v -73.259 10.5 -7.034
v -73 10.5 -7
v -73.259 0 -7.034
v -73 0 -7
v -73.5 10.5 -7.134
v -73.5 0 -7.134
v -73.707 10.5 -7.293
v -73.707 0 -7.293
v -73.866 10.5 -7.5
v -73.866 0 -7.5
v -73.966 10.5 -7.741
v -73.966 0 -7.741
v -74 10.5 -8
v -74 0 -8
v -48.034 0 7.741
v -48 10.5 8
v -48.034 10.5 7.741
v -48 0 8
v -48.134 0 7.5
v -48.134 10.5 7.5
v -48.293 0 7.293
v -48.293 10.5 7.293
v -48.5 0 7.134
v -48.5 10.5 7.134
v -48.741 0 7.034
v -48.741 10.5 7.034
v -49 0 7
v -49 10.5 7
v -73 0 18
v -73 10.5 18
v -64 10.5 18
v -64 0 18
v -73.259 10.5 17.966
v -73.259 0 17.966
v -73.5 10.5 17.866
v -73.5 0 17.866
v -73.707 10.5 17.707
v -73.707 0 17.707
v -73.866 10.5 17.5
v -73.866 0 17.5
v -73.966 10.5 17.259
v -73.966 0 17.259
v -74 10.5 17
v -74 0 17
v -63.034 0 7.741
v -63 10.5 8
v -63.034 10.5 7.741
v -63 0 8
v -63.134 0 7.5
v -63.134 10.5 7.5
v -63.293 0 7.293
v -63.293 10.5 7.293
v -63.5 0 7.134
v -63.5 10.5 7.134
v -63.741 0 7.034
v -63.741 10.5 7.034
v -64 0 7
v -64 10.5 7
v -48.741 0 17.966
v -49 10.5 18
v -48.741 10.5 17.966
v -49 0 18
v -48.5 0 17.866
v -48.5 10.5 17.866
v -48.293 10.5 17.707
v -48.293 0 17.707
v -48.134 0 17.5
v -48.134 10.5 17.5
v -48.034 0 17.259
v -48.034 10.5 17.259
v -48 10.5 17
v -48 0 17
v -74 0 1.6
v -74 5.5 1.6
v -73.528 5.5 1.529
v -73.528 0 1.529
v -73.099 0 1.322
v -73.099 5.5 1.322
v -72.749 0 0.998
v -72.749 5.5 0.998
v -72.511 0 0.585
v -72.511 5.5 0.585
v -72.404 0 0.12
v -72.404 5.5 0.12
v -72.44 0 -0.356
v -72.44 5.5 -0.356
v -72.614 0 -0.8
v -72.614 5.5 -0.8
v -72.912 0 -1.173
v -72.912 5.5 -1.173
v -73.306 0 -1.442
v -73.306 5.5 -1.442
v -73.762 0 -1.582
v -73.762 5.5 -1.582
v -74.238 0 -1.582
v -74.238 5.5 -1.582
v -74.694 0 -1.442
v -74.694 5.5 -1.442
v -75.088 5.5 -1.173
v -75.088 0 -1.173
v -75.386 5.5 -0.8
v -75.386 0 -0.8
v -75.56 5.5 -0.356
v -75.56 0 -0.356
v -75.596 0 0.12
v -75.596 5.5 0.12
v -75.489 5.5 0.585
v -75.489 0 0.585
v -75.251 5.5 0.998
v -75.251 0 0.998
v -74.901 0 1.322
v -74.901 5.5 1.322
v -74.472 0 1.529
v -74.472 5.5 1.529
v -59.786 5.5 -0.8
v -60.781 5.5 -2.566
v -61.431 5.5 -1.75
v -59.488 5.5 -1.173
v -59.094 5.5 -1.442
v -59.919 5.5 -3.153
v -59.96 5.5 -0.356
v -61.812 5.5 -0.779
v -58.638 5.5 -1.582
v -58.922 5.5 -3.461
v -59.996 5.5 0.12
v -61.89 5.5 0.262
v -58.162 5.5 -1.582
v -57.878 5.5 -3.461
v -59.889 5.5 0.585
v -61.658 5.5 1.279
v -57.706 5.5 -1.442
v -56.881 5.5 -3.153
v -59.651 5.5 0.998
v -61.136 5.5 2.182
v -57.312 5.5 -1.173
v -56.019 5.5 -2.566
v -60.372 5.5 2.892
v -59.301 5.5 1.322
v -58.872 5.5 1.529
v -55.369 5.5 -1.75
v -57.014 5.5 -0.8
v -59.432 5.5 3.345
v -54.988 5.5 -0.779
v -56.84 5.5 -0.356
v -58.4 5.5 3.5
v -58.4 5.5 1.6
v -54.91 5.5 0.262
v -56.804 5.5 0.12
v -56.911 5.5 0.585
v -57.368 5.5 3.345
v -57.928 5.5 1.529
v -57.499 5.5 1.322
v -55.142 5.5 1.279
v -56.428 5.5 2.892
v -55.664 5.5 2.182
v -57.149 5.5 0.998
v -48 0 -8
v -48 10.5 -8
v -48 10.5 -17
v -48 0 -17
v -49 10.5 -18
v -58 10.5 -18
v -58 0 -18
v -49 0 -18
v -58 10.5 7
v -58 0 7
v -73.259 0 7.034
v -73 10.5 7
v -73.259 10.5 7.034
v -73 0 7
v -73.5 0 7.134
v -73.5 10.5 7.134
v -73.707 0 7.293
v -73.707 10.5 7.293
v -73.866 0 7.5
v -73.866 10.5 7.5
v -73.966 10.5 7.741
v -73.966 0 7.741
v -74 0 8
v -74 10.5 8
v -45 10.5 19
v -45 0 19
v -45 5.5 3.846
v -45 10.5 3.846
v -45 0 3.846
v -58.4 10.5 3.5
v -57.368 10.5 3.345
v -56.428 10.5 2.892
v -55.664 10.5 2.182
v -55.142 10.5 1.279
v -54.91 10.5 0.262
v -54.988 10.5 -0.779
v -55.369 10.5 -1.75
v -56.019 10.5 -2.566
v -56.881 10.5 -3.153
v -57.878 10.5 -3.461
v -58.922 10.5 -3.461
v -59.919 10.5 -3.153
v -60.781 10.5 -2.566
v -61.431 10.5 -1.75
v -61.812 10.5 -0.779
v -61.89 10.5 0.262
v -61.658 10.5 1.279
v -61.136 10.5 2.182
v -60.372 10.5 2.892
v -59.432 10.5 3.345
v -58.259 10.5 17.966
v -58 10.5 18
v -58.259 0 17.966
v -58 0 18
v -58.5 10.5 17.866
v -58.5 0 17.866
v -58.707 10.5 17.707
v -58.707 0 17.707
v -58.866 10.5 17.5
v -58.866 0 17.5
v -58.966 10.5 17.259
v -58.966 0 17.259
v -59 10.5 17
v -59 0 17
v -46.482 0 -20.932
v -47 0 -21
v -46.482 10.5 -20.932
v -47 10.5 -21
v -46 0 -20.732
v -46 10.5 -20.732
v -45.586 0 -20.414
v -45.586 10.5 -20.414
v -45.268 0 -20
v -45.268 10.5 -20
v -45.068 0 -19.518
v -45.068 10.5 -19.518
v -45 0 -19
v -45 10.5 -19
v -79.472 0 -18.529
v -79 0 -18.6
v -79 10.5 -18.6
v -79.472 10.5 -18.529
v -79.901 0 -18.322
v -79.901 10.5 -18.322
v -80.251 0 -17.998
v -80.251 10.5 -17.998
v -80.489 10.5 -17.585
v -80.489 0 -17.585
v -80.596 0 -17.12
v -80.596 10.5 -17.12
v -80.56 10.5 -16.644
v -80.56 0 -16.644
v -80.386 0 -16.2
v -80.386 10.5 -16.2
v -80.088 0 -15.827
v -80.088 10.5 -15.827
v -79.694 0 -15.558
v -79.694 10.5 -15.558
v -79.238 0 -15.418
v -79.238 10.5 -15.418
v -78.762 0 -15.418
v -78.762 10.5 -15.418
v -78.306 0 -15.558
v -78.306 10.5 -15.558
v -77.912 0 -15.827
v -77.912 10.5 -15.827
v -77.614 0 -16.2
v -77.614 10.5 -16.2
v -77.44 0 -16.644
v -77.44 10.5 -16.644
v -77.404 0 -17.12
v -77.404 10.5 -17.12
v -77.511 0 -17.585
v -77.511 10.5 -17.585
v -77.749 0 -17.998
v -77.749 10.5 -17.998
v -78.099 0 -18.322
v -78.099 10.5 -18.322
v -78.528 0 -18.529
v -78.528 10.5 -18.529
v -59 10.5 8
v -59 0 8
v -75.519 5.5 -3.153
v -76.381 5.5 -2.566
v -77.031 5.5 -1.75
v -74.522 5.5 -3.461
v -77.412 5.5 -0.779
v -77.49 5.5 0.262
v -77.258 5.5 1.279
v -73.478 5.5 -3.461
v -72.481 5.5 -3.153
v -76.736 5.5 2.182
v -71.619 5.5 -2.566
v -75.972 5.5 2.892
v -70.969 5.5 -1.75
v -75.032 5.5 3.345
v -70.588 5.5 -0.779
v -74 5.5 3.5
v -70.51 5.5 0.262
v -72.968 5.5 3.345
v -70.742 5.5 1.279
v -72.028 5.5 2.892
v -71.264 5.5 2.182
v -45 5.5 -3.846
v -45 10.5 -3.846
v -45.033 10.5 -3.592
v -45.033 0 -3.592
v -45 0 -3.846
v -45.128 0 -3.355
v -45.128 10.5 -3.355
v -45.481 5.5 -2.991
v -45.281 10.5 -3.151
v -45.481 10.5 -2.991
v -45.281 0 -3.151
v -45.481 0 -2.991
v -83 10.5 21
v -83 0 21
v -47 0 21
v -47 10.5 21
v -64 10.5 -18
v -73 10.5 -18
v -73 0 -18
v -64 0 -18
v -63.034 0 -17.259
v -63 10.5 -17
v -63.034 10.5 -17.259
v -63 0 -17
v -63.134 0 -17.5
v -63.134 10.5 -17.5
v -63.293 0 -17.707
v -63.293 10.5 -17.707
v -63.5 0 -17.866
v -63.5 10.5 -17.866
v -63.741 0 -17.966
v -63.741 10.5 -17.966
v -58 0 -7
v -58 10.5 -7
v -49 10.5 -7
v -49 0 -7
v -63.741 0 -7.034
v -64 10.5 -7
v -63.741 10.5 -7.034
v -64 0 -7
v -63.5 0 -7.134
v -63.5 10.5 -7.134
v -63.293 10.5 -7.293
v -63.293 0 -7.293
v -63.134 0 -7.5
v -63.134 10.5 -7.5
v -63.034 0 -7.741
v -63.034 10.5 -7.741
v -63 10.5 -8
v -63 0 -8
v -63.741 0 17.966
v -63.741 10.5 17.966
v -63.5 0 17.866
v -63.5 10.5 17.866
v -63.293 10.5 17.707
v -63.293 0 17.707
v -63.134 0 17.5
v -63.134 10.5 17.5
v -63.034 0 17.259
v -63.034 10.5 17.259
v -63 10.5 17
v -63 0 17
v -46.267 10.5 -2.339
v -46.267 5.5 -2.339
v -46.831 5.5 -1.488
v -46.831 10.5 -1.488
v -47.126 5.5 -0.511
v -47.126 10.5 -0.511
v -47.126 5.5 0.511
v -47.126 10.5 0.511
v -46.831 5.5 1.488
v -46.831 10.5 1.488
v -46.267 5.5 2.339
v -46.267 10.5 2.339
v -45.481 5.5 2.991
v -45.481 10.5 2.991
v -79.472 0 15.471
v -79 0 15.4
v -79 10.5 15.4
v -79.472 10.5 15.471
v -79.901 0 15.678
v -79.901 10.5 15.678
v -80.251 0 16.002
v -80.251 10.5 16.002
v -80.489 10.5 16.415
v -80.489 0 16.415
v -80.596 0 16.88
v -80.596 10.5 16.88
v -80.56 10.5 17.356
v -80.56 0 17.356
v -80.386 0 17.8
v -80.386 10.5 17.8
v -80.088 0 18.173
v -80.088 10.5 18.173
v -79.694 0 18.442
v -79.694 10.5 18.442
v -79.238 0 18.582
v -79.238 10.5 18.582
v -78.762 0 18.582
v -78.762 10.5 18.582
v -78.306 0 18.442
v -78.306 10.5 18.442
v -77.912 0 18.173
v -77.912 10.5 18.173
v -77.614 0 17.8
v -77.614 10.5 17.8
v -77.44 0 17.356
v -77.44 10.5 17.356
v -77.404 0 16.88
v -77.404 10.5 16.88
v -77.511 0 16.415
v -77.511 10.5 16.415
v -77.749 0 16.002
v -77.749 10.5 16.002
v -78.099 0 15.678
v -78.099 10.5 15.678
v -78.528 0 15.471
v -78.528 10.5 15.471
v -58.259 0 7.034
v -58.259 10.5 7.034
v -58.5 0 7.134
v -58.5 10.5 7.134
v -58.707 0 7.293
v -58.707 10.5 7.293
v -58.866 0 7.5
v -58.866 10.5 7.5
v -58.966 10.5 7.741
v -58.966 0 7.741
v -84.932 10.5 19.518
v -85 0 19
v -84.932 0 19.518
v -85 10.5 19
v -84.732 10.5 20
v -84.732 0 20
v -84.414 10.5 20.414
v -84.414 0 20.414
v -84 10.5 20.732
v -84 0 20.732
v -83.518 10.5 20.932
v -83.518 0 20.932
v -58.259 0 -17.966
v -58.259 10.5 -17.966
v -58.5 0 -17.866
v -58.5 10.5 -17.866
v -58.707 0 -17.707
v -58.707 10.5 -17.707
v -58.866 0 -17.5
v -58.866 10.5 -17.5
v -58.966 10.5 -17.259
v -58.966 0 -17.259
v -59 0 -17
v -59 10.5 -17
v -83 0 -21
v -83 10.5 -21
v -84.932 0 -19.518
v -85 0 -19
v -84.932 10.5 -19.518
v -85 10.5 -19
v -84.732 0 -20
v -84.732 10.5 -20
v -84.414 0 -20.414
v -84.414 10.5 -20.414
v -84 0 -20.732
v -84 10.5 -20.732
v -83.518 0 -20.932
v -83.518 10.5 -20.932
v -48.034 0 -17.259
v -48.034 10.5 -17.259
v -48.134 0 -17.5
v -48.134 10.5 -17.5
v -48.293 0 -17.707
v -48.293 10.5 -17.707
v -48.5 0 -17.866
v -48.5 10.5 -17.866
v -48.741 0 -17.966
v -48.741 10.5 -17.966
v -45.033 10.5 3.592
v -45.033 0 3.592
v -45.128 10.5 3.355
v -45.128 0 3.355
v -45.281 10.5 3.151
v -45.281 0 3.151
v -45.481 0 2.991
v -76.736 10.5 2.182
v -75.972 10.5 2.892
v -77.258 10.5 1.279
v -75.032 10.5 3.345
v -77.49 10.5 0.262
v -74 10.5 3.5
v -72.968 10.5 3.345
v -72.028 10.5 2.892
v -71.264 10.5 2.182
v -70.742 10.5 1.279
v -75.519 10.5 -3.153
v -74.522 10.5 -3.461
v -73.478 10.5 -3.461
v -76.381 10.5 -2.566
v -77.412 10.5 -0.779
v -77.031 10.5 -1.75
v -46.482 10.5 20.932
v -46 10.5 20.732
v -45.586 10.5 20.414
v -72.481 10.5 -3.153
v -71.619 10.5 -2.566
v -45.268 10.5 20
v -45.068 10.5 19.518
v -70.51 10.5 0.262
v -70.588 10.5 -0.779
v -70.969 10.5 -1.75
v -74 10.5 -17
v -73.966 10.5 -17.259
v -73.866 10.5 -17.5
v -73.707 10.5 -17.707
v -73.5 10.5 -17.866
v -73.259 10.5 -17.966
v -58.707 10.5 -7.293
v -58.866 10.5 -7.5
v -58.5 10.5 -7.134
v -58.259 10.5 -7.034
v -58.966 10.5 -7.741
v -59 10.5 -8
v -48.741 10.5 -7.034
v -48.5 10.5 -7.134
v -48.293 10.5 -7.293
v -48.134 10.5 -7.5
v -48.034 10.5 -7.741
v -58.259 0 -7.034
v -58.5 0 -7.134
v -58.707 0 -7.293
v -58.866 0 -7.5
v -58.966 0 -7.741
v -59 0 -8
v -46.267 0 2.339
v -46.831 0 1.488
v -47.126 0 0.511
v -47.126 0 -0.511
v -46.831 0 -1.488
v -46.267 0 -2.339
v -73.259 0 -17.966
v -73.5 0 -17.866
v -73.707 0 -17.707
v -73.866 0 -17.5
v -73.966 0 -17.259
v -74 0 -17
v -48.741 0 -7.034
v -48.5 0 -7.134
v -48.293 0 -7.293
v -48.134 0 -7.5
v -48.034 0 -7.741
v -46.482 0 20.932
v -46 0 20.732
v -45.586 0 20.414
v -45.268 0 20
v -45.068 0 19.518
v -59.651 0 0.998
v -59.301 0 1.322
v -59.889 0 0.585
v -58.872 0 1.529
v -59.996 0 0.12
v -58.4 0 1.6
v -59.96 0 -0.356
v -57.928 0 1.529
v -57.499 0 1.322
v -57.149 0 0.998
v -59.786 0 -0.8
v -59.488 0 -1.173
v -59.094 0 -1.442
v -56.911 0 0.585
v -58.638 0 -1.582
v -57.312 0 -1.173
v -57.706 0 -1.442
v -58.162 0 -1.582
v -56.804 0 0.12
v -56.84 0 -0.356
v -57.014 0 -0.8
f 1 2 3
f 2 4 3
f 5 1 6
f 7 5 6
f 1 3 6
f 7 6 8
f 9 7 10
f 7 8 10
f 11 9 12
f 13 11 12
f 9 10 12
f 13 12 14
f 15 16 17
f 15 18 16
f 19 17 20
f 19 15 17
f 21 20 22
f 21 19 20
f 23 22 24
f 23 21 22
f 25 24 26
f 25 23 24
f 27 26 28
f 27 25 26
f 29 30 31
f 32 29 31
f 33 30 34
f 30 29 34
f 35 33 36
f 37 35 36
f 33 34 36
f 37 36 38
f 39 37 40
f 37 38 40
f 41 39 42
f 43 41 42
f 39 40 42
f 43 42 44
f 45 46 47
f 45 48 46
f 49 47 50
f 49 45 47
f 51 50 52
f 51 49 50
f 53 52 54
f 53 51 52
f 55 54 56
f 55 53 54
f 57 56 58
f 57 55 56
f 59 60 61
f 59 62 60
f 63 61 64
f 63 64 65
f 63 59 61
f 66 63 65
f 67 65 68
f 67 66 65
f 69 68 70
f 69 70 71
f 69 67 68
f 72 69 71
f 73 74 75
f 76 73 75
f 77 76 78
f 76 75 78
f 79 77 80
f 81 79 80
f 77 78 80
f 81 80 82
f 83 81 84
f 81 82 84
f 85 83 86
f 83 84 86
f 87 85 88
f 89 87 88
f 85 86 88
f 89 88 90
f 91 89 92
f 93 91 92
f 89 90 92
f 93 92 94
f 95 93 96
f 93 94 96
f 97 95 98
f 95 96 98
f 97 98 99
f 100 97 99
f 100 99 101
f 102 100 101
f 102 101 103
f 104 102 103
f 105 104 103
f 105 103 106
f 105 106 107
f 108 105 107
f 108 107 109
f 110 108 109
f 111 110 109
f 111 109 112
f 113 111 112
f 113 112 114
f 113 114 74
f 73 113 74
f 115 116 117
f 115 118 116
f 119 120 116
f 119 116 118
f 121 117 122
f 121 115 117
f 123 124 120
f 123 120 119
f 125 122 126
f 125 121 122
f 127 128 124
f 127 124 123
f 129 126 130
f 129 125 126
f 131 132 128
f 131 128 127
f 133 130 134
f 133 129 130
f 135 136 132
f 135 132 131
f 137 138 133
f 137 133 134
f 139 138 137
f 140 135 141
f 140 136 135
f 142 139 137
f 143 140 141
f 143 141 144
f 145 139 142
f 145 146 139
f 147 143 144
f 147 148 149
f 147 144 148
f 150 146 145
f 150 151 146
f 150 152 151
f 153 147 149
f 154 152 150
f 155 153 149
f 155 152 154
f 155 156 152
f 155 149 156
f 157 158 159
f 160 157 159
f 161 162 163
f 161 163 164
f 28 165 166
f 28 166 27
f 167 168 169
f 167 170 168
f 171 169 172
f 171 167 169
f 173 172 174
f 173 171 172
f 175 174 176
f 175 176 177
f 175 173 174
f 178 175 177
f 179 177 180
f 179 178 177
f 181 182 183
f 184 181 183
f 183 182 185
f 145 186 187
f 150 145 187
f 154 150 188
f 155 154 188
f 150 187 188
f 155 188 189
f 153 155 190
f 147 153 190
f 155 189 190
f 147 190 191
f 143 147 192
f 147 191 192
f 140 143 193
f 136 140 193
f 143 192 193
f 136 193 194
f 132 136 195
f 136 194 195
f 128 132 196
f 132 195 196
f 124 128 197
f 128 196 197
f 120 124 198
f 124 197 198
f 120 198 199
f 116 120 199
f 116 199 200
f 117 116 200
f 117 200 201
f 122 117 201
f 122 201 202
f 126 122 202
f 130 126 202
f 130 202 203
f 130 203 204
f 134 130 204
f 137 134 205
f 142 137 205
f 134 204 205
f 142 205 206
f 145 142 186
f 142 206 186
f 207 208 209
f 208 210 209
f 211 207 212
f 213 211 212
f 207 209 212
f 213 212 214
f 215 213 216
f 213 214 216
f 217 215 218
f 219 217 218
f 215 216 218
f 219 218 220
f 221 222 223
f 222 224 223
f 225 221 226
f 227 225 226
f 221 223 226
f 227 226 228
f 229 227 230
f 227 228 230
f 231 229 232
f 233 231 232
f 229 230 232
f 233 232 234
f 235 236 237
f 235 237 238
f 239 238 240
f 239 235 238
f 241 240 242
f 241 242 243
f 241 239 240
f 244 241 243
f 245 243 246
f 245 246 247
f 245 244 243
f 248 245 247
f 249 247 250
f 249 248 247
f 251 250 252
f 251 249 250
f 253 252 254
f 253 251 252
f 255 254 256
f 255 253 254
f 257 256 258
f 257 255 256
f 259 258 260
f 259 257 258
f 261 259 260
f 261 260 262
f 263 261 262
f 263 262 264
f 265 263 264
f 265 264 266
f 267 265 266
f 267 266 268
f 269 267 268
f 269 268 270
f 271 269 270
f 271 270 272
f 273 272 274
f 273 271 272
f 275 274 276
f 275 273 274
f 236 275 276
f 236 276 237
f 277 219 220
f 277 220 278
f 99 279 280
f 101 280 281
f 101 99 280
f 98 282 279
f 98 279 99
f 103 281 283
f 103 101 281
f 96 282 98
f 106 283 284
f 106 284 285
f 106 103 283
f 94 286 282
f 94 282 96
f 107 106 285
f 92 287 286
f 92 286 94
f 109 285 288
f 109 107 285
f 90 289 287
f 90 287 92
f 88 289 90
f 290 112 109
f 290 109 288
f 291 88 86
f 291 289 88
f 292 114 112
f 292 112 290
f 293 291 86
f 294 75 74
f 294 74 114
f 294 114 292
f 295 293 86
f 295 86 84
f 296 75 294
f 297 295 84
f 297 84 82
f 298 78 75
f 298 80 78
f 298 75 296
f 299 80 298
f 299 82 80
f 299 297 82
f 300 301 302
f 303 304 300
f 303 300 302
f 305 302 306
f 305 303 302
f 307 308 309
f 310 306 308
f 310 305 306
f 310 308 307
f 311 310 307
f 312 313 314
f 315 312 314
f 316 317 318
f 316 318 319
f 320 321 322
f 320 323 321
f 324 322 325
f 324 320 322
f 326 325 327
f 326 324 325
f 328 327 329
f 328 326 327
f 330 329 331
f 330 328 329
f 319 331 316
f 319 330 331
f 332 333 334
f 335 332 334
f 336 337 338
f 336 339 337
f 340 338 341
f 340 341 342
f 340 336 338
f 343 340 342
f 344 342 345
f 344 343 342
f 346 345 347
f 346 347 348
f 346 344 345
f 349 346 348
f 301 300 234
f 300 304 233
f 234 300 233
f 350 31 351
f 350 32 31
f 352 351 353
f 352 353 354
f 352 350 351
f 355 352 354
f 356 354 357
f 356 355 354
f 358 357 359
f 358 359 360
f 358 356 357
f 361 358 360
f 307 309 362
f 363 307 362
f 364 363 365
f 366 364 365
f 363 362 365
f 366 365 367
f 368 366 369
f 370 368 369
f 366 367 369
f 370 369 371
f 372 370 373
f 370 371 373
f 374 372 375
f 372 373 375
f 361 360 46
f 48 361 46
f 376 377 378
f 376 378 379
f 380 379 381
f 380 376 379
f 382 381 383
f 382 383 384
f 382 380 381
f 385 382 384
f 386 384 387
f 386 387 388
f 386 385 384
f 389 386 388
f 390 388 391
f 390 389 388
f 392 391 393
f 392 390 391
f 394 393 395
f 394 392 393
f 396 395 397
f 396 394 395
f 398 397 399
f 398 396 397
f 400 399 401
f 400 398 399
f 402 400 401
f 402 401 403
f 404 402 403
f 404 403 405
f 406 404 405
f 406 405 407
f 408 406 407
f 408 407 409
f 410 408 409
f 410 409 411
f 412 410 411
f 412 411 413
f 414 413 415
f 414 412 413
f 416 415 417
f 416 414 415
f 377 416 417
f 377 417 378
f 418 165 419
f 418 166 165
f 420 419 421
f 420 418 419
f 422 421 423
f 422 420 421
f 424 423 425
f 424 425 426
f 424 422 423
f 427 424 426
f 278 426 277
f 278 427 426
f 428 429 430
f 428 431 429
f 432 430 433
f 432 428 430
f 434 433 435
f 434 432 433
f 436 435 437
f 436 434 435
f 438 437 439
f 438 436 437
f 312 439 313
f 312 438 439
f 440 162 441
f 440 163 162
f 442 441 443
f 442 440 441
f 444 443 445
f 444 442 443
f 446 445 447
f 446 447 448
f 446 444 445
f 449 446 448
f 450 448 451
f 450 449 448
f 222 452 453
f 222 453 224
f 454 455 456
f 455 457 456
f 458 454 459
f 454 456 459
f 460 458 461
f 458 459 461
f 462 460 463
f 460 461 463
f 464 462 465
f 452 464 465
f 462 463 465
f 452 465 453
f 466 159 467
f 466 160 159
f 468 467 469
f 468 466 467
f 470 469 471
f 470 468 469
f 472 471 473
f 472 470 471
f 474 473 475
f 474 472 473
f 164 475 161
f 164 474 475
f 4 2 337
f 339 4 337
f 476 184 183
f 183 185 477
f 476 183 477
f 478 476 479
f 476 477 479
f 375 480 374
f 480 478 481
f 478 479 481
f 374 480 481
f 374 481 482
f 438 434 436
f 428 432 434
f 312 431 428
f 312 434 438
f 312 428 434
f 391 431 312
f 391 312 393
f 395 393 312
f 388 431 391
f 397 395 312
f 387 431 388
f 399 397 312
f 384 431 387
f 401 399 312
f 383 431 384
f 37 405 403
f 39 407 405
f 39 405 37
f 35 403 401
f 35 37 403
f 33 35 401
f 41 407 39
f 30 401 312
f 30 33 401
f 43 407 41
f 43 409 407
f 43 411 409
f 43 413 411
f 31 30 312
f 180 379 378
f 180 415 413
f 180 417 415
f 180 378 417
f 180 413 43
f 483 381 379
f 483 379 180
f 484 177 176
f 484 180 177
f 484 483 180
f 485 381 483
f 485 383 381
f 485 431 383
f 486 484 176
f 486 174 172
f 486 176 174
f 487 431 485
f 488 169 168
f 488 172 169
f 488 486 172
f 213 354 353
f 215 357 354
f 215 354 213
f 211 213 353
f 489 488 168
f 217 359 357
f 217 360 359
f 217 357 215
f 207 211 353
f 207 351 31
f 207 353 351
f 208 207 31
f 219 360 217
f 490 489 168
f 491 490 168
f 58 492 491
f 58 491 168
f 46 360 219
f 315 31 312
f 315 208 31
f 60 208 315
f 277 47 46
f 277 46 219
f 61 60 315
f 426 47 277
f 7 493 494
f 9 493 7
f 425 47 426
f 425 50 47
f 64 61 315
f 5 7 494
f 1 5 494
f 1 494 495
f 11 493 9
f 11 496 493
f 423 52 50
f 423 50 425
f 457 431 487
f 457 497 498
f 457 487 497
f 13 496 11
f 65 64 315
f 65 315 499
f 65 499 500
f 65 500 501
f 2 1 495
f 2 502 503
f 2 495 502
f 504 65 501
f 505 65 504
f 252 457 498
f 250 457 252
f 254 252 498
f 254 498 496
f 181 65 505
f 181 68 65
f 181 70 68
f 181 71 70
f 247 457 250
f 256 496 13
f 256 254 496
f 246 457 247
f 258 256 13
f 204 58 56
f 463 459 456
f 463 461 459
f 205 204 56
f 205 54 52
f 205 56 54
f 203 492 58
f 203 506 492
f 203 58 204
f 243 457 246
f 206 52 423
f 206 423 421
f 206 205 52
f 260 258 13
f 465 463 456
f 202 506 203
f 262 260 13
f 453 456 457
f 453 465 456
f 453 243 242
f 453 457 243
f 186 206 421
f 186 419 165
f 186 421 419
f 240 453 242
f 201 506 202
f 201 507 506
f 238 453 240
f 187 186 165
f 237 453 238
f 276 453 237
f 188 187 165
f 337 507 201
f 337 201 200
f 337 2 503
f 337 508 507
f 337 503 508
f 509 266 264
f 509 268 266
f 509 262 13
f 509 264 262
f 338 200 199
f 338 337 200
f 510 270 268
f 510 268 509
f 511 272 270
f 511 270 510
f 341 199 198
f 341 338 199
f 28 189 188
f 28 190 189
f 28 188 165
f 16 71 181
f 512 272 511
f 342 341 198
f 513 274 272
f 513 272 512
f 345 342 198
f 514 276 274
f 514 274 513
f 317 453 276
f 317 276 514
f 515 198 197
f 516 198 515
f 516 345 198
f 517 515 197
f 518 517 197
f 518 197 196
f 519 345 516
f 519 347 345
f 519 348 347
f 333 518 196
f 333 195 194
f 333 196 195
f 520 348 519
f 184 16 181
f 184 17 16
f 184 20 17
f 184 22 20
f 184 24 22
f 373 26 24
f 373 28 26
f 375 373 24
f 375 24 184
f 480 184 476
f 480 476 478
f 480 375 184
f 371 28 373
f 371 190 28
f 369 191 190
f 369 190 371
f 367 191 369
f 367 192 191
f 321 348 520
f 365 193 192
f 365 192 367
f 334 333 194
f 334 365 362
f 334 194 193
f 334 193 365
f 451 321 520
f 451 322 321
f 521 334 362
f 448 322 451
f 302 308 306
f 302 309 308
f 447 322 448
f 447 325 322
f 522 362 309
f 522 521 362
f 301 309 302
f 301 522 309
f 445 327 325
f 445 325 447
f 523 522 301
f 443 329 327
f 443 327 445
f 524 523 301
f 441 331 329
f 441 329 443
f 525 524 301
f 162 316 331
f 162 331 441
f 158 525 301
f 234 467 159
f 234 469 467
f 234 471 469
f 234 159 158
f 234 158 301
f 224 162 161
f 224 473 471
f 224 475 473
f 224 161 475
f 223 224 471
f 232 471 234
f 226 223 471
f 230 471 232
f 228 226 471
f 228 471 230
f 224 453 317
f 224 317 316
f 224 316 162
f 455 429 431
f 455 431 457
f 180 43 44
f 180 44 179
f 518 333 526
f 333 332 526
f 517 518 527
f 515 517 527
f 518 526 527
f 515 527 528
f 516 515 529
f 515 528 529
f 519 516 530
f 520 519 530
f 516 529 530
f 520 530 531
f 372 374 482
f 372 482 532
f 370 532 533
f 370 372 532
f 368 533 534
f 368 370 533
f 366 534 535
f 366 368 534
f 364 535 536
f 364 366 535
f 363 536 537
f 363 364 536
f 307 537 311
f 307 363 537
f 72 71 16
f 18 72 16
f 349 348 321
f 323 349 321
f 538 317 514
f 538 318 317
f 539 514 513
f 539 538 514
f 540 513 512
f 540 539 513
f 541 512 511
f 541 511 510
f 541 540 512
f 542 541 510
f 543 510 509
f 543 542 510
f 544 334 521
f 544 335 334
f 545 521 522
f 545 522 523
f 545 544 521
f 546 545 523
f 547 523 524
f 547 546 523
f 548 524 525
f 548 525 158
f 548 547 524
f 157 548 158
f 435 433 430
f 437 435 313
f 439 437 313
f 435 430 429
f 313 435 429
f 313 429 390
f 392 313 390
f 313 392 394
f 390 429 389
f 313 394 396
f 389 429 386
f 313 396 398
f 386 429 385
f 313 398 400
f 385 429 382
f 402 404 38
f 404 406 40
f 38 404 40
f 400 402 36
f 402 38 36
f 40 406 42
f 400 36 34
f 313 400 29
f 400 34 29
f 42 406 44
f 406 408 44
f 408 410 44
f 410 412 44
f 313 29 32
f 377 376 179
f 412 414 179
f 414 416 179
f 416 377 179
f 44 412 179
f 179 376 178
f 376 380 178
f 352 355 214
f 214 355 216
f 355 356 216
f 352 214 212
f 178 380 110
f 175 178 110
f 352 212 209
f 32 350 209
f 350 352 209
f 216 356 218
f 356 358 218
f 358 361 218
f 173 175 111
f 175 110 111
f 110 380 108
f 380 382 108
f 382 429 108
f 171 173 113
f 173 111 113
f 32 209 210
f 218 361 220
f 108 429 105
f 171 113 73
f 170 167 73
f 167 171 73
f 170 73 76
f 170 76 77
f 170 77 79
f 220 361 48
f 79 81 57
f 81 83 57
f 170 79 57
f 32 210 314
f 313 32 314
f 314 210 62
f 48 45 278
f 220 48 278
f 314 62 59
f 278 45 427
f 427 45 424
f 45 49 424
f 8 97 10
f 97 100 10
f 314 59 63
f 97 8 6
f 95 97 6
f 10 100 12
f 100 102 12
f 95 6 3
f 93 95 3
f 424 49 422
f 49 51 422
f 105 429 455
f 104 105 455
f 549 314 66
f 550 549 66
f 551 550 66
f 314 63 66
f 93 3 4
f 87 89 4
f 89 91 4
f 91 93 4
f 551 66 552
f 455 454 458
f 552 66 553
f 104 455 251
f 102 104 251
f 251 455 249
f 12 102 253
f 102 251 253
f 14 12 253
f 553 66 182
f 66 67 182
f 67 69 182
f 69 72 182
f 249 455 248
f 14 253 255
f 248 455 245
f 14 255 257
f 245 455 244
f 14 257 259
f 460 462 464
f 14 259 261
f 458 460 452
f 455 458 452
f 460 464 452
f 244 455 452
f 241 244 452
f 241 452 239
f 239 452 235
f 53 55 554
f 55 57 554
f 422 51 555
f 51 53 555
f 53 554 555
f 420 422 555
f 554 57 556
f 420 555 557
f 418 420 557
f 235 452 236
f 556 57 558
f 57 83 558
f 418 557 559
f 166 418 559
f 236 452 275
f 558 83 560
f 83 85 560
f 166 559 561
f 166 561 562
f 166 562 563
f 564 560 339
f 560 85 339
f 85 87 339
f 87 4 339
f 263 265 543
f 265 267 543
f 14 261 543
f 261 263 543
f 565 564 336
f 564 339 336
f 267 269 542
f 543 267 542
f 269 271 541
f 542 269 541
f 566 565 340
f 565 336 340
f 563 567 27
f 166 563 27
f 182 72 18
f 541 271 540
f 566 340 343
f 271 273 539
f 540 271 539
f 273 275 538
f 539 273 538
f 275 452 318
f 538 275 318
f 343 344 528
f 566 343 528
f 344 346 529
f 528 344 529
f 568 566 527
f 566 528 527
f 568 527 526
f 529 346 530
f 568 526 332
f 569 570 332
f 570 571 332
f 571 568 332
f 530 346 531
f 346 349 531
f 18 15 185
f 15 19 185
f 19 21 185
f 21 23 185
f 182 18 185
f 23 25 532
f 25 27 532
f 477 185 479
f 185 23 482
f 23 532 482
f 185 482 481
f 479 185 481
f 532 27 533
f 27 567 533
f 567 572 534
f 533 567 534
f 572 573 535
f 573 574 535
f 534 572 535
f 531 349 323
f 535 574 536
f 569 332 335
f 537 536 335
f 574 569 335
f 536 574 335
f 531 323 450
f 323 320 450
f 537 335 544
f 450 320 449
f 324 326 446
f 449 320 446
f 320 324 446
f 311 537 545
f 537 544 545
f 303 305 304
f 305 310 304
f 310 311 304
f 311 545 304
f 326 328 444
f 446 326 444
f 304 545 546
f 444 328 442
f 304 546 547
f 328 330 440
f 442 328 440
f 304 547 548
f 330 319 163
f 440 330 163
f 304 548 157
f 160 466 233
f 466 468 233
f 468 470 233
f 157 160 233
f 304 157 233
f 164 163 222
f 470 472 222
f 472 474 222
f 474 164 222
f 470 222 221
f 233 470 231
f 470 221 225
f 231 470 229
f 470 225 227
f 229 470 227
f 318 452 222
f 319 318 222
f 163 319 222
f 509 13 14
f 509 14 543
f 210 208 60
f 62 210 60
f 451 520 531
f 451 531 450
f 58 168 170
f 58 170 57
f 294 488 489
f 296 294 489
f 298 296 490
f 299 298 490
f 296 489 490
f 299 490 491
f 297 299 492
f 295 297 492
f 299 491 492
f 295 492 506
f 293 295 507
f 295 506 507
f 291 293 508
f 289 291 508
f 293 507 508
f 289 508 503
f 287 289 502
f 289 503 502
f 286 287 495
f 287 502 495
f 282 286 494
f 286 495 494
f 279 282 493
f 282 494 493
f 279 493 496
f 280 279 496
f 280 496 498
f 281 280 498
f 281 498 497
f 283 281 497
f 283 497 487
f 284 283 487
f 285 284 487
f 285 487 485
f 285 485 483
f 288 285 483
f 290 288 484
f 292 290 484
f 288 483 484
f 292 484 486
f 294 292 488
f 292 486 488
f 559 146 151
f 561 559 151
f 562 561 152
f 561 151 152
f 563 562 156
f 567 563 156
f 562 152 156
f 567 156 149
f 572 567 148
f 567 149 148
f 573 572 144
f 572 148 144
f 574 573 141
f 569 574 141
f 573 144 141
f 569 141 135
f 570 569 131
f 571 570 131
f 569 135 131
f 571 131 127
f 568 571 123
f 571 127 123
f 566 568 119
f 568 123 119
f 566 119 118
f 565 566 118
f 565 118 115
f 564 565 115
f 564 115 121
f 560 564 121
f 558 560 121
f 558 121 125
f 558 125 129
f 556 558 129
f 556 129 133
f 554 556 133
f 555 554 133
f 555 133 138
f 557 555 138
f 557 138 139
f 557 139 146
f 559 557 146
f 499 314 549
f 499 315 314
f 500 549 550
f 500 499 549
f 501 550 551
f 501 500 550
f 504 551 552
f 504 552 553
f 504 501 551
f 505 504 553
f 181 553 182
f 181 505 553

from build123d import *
from build123d.topology import SkipClean

# Parameters (mm, degrees)
SKETCH_1_W          = 40
SKETCH_1_H          = 42
SKETCH_1_R          = 1.6
EXTRUDE_1_DEPTH     = 10.5
FILLET_1_R          = 2
SKETCH_2_R          = 1.6
CUT_EXTRUDE_1_DEPTH = 89.183048258
EXTRUDE_START       = -10.5
SKETCH_3_R          = 1.6
EXTRUDE_2_DEPTH     = 10.5
SKETCH_4_R          = 3.5
CUT_EXTRUDE_2_DEPTH = 5
CUT_EXTRUDE_3_DEPTH = 88.728273664
SKETCH_6_W          = 11
SKETCH_6_H          = 11
CUT_EXTRUDE_4_DEPTH = 89.183048258
FILLET_2_R          = 1


with BuildPart() as part:
    # 草图1 → 凸台-拉伸1 (new body)
    with BuildSketch(Plane(origin=(0, 0, 0), x_dir=(1, 0, 0), z_dir=(0, 1, 0))):
        with Locations((-65, 0)):
            Rectangle(SKETCH_1_W, SKETCH_1_H)
        with Locations(Location((-79, -17, 0), (0, 0, 90))):
            Circle(SKETCH_1_R, mode=Mode.SUBTRACT)
        with Locations(Location((-69, 0, 0), (0, 0, 90))):
            Circle(SKETCH_1_R, mode=Mode.SUBTRACT)
        with Locations(Location((-79, 17, 0), (0, 0, 90))):
            Circle(SKETCH_1_R, mode=Mode.SUBTRACT)
    extrude(amount=EXTRUDE_1_DEPTH)

    # 圆角1
    fillet_1_edges = [part.edges().sort_by_distance(p)[0] for p in [
        (-45, 5.25, -21),
        (-45, 5.25, 21),
        (-85, 5.25, 21),
        (-85, 5.25, -21),
    ]]
    fillet(fillet_1_edges, radius=FILLET_1_R)

    # 草图2 → 切除-拉伸1 (cut, through all)
    with BuildSketch(Plane(origin=(0, 10.5, 0), x_dir=(1, 0, 0), z_dir=(0, 1, 0))):
        with Locations(Location((-74, 0, 0), (0, 0, 270))):
            Circle(SKETCH_2_R)
        with Locations((-44, 0)):
            Circle(SKETCH_2_R)
        with Locations(Location((-58.4, 0, 0), (0, 0, 270))):
            Circle(SKETCH_2_R)
    extrude(amount=-CUT_EXTRUDE_1_DEPTH, mode=Mode.SUBTRACT)

    # 草图3 → 凸台-拉伸2 (add)
    with BuildSketch(Plane(origin=(0, 10.5, 0), x_dir=(1, 0, 0), z_dir=(0, 1, 0)).offset(EXTRUDE_START)):
        with Locations((-69, 0)):
            Circle(SKETCH_3_R)
    extrude(amount=EXTRUDE_2_DEPTH)

    # 草图4 → 切除-拉伸2 (cut)
    with BuildSketch(Plane(origin=(0, 10.5, 0), x_dir=(1, 0, 0), z_dir=(0, 1, 0))):
        with Locations(Location((-74, 0, 0), (0, 0, 270))):
            Circle(SKETCH_4_R)
        with Locations(Location((-58.4, 0, 0), (0, 0, 270))):
            Circle(SKETCH_4_R)
        with Locations((-43.663101604, 0)):
            Circle(SKETCH_4_R)
    extrude(amount=-CUT_EXTRUDE_2_DEPTH, mode=Mode.SUBTRACT)

    # 草图5 → 切除-拉伸3 (cut, through all)
    with SkipClean():  # the faces are left unmerged after this step: merging them gives an invalid solid
        with BuildSketch(Plane(origin=(0, 5.5, 0), x_dir=(1, 0, 0), z_dir=(0, 1, 0))):
            with BuildLine():
                Line((-45, 3.234610128), (-45, -3.234610128))
                ThreePointArc((-45, -3.234610128), (-47.163101604, 0), (-45, 3.234610128))
            make_face()
        extrude(amount=-CUT_EXTRUDE_3_DEPTH, mode=Mode.SUBTRACT)

    # 草图6 → 切除-拉伸4 (cut, through all)
    with SkipClean():  # the faces are left unmerged after this step: merging them gives an invalid solid
        with BuildSketch(Plane(origin=(0, 10.5, 0), x_dir=(1, 0, 0), z_dir=(0, 1, 0))):
            with Locations((-68.5, 12.5)):
                Rectangle(SKETCH_6_W, SKETCH_6_H)
            with Locations((-53.5, 12.5)):
                Rectangle(SKETCH_6_W, SKETCH_6_H)
            with Locations((-68.5, -12.5)):
                Rectangle(SKETCH_6_W, SKETCH_6_H)
            with Locations((-53.5, -12.5)):
                Rectangle(SKETCH_6_W, SKETCH_6_H)
        extrude(amount=-CUT_EXTRUDE_4_DEPTH, mode=Mode.SUBTRACT)

    # 圆角2
    fillet_2_edges = [part.edges().sort_by_distance(p)[0] for p in [
        (-59, 5.25, -18),
        (-48, 5.25, -18),
        (-48, 5.25, -7),
        (-59, 5.25, -7),
        (-74, 5.25, 7),
        (-63, 5.25, 7),
        (-63, 5.25, 18),
        (-74, 5.25, 18),
        (-59, 5.25, 7),
        (-48, 5.25, 7),
        (-48, 5.25, 18),
        (-59, 5.25, 18),
        (-63, 5.25, -18),
        (-63, 5.25, -7),
        (-74, 5.25, -7),
        (-74, 5.25, -18),
        (-45, 2.75, -3.234610128),
        (-45, 2.75, 3.234610128),
    ]]
    fillet(fillet_2_edges, radius=FILLET_2_R)


solid = part.part
